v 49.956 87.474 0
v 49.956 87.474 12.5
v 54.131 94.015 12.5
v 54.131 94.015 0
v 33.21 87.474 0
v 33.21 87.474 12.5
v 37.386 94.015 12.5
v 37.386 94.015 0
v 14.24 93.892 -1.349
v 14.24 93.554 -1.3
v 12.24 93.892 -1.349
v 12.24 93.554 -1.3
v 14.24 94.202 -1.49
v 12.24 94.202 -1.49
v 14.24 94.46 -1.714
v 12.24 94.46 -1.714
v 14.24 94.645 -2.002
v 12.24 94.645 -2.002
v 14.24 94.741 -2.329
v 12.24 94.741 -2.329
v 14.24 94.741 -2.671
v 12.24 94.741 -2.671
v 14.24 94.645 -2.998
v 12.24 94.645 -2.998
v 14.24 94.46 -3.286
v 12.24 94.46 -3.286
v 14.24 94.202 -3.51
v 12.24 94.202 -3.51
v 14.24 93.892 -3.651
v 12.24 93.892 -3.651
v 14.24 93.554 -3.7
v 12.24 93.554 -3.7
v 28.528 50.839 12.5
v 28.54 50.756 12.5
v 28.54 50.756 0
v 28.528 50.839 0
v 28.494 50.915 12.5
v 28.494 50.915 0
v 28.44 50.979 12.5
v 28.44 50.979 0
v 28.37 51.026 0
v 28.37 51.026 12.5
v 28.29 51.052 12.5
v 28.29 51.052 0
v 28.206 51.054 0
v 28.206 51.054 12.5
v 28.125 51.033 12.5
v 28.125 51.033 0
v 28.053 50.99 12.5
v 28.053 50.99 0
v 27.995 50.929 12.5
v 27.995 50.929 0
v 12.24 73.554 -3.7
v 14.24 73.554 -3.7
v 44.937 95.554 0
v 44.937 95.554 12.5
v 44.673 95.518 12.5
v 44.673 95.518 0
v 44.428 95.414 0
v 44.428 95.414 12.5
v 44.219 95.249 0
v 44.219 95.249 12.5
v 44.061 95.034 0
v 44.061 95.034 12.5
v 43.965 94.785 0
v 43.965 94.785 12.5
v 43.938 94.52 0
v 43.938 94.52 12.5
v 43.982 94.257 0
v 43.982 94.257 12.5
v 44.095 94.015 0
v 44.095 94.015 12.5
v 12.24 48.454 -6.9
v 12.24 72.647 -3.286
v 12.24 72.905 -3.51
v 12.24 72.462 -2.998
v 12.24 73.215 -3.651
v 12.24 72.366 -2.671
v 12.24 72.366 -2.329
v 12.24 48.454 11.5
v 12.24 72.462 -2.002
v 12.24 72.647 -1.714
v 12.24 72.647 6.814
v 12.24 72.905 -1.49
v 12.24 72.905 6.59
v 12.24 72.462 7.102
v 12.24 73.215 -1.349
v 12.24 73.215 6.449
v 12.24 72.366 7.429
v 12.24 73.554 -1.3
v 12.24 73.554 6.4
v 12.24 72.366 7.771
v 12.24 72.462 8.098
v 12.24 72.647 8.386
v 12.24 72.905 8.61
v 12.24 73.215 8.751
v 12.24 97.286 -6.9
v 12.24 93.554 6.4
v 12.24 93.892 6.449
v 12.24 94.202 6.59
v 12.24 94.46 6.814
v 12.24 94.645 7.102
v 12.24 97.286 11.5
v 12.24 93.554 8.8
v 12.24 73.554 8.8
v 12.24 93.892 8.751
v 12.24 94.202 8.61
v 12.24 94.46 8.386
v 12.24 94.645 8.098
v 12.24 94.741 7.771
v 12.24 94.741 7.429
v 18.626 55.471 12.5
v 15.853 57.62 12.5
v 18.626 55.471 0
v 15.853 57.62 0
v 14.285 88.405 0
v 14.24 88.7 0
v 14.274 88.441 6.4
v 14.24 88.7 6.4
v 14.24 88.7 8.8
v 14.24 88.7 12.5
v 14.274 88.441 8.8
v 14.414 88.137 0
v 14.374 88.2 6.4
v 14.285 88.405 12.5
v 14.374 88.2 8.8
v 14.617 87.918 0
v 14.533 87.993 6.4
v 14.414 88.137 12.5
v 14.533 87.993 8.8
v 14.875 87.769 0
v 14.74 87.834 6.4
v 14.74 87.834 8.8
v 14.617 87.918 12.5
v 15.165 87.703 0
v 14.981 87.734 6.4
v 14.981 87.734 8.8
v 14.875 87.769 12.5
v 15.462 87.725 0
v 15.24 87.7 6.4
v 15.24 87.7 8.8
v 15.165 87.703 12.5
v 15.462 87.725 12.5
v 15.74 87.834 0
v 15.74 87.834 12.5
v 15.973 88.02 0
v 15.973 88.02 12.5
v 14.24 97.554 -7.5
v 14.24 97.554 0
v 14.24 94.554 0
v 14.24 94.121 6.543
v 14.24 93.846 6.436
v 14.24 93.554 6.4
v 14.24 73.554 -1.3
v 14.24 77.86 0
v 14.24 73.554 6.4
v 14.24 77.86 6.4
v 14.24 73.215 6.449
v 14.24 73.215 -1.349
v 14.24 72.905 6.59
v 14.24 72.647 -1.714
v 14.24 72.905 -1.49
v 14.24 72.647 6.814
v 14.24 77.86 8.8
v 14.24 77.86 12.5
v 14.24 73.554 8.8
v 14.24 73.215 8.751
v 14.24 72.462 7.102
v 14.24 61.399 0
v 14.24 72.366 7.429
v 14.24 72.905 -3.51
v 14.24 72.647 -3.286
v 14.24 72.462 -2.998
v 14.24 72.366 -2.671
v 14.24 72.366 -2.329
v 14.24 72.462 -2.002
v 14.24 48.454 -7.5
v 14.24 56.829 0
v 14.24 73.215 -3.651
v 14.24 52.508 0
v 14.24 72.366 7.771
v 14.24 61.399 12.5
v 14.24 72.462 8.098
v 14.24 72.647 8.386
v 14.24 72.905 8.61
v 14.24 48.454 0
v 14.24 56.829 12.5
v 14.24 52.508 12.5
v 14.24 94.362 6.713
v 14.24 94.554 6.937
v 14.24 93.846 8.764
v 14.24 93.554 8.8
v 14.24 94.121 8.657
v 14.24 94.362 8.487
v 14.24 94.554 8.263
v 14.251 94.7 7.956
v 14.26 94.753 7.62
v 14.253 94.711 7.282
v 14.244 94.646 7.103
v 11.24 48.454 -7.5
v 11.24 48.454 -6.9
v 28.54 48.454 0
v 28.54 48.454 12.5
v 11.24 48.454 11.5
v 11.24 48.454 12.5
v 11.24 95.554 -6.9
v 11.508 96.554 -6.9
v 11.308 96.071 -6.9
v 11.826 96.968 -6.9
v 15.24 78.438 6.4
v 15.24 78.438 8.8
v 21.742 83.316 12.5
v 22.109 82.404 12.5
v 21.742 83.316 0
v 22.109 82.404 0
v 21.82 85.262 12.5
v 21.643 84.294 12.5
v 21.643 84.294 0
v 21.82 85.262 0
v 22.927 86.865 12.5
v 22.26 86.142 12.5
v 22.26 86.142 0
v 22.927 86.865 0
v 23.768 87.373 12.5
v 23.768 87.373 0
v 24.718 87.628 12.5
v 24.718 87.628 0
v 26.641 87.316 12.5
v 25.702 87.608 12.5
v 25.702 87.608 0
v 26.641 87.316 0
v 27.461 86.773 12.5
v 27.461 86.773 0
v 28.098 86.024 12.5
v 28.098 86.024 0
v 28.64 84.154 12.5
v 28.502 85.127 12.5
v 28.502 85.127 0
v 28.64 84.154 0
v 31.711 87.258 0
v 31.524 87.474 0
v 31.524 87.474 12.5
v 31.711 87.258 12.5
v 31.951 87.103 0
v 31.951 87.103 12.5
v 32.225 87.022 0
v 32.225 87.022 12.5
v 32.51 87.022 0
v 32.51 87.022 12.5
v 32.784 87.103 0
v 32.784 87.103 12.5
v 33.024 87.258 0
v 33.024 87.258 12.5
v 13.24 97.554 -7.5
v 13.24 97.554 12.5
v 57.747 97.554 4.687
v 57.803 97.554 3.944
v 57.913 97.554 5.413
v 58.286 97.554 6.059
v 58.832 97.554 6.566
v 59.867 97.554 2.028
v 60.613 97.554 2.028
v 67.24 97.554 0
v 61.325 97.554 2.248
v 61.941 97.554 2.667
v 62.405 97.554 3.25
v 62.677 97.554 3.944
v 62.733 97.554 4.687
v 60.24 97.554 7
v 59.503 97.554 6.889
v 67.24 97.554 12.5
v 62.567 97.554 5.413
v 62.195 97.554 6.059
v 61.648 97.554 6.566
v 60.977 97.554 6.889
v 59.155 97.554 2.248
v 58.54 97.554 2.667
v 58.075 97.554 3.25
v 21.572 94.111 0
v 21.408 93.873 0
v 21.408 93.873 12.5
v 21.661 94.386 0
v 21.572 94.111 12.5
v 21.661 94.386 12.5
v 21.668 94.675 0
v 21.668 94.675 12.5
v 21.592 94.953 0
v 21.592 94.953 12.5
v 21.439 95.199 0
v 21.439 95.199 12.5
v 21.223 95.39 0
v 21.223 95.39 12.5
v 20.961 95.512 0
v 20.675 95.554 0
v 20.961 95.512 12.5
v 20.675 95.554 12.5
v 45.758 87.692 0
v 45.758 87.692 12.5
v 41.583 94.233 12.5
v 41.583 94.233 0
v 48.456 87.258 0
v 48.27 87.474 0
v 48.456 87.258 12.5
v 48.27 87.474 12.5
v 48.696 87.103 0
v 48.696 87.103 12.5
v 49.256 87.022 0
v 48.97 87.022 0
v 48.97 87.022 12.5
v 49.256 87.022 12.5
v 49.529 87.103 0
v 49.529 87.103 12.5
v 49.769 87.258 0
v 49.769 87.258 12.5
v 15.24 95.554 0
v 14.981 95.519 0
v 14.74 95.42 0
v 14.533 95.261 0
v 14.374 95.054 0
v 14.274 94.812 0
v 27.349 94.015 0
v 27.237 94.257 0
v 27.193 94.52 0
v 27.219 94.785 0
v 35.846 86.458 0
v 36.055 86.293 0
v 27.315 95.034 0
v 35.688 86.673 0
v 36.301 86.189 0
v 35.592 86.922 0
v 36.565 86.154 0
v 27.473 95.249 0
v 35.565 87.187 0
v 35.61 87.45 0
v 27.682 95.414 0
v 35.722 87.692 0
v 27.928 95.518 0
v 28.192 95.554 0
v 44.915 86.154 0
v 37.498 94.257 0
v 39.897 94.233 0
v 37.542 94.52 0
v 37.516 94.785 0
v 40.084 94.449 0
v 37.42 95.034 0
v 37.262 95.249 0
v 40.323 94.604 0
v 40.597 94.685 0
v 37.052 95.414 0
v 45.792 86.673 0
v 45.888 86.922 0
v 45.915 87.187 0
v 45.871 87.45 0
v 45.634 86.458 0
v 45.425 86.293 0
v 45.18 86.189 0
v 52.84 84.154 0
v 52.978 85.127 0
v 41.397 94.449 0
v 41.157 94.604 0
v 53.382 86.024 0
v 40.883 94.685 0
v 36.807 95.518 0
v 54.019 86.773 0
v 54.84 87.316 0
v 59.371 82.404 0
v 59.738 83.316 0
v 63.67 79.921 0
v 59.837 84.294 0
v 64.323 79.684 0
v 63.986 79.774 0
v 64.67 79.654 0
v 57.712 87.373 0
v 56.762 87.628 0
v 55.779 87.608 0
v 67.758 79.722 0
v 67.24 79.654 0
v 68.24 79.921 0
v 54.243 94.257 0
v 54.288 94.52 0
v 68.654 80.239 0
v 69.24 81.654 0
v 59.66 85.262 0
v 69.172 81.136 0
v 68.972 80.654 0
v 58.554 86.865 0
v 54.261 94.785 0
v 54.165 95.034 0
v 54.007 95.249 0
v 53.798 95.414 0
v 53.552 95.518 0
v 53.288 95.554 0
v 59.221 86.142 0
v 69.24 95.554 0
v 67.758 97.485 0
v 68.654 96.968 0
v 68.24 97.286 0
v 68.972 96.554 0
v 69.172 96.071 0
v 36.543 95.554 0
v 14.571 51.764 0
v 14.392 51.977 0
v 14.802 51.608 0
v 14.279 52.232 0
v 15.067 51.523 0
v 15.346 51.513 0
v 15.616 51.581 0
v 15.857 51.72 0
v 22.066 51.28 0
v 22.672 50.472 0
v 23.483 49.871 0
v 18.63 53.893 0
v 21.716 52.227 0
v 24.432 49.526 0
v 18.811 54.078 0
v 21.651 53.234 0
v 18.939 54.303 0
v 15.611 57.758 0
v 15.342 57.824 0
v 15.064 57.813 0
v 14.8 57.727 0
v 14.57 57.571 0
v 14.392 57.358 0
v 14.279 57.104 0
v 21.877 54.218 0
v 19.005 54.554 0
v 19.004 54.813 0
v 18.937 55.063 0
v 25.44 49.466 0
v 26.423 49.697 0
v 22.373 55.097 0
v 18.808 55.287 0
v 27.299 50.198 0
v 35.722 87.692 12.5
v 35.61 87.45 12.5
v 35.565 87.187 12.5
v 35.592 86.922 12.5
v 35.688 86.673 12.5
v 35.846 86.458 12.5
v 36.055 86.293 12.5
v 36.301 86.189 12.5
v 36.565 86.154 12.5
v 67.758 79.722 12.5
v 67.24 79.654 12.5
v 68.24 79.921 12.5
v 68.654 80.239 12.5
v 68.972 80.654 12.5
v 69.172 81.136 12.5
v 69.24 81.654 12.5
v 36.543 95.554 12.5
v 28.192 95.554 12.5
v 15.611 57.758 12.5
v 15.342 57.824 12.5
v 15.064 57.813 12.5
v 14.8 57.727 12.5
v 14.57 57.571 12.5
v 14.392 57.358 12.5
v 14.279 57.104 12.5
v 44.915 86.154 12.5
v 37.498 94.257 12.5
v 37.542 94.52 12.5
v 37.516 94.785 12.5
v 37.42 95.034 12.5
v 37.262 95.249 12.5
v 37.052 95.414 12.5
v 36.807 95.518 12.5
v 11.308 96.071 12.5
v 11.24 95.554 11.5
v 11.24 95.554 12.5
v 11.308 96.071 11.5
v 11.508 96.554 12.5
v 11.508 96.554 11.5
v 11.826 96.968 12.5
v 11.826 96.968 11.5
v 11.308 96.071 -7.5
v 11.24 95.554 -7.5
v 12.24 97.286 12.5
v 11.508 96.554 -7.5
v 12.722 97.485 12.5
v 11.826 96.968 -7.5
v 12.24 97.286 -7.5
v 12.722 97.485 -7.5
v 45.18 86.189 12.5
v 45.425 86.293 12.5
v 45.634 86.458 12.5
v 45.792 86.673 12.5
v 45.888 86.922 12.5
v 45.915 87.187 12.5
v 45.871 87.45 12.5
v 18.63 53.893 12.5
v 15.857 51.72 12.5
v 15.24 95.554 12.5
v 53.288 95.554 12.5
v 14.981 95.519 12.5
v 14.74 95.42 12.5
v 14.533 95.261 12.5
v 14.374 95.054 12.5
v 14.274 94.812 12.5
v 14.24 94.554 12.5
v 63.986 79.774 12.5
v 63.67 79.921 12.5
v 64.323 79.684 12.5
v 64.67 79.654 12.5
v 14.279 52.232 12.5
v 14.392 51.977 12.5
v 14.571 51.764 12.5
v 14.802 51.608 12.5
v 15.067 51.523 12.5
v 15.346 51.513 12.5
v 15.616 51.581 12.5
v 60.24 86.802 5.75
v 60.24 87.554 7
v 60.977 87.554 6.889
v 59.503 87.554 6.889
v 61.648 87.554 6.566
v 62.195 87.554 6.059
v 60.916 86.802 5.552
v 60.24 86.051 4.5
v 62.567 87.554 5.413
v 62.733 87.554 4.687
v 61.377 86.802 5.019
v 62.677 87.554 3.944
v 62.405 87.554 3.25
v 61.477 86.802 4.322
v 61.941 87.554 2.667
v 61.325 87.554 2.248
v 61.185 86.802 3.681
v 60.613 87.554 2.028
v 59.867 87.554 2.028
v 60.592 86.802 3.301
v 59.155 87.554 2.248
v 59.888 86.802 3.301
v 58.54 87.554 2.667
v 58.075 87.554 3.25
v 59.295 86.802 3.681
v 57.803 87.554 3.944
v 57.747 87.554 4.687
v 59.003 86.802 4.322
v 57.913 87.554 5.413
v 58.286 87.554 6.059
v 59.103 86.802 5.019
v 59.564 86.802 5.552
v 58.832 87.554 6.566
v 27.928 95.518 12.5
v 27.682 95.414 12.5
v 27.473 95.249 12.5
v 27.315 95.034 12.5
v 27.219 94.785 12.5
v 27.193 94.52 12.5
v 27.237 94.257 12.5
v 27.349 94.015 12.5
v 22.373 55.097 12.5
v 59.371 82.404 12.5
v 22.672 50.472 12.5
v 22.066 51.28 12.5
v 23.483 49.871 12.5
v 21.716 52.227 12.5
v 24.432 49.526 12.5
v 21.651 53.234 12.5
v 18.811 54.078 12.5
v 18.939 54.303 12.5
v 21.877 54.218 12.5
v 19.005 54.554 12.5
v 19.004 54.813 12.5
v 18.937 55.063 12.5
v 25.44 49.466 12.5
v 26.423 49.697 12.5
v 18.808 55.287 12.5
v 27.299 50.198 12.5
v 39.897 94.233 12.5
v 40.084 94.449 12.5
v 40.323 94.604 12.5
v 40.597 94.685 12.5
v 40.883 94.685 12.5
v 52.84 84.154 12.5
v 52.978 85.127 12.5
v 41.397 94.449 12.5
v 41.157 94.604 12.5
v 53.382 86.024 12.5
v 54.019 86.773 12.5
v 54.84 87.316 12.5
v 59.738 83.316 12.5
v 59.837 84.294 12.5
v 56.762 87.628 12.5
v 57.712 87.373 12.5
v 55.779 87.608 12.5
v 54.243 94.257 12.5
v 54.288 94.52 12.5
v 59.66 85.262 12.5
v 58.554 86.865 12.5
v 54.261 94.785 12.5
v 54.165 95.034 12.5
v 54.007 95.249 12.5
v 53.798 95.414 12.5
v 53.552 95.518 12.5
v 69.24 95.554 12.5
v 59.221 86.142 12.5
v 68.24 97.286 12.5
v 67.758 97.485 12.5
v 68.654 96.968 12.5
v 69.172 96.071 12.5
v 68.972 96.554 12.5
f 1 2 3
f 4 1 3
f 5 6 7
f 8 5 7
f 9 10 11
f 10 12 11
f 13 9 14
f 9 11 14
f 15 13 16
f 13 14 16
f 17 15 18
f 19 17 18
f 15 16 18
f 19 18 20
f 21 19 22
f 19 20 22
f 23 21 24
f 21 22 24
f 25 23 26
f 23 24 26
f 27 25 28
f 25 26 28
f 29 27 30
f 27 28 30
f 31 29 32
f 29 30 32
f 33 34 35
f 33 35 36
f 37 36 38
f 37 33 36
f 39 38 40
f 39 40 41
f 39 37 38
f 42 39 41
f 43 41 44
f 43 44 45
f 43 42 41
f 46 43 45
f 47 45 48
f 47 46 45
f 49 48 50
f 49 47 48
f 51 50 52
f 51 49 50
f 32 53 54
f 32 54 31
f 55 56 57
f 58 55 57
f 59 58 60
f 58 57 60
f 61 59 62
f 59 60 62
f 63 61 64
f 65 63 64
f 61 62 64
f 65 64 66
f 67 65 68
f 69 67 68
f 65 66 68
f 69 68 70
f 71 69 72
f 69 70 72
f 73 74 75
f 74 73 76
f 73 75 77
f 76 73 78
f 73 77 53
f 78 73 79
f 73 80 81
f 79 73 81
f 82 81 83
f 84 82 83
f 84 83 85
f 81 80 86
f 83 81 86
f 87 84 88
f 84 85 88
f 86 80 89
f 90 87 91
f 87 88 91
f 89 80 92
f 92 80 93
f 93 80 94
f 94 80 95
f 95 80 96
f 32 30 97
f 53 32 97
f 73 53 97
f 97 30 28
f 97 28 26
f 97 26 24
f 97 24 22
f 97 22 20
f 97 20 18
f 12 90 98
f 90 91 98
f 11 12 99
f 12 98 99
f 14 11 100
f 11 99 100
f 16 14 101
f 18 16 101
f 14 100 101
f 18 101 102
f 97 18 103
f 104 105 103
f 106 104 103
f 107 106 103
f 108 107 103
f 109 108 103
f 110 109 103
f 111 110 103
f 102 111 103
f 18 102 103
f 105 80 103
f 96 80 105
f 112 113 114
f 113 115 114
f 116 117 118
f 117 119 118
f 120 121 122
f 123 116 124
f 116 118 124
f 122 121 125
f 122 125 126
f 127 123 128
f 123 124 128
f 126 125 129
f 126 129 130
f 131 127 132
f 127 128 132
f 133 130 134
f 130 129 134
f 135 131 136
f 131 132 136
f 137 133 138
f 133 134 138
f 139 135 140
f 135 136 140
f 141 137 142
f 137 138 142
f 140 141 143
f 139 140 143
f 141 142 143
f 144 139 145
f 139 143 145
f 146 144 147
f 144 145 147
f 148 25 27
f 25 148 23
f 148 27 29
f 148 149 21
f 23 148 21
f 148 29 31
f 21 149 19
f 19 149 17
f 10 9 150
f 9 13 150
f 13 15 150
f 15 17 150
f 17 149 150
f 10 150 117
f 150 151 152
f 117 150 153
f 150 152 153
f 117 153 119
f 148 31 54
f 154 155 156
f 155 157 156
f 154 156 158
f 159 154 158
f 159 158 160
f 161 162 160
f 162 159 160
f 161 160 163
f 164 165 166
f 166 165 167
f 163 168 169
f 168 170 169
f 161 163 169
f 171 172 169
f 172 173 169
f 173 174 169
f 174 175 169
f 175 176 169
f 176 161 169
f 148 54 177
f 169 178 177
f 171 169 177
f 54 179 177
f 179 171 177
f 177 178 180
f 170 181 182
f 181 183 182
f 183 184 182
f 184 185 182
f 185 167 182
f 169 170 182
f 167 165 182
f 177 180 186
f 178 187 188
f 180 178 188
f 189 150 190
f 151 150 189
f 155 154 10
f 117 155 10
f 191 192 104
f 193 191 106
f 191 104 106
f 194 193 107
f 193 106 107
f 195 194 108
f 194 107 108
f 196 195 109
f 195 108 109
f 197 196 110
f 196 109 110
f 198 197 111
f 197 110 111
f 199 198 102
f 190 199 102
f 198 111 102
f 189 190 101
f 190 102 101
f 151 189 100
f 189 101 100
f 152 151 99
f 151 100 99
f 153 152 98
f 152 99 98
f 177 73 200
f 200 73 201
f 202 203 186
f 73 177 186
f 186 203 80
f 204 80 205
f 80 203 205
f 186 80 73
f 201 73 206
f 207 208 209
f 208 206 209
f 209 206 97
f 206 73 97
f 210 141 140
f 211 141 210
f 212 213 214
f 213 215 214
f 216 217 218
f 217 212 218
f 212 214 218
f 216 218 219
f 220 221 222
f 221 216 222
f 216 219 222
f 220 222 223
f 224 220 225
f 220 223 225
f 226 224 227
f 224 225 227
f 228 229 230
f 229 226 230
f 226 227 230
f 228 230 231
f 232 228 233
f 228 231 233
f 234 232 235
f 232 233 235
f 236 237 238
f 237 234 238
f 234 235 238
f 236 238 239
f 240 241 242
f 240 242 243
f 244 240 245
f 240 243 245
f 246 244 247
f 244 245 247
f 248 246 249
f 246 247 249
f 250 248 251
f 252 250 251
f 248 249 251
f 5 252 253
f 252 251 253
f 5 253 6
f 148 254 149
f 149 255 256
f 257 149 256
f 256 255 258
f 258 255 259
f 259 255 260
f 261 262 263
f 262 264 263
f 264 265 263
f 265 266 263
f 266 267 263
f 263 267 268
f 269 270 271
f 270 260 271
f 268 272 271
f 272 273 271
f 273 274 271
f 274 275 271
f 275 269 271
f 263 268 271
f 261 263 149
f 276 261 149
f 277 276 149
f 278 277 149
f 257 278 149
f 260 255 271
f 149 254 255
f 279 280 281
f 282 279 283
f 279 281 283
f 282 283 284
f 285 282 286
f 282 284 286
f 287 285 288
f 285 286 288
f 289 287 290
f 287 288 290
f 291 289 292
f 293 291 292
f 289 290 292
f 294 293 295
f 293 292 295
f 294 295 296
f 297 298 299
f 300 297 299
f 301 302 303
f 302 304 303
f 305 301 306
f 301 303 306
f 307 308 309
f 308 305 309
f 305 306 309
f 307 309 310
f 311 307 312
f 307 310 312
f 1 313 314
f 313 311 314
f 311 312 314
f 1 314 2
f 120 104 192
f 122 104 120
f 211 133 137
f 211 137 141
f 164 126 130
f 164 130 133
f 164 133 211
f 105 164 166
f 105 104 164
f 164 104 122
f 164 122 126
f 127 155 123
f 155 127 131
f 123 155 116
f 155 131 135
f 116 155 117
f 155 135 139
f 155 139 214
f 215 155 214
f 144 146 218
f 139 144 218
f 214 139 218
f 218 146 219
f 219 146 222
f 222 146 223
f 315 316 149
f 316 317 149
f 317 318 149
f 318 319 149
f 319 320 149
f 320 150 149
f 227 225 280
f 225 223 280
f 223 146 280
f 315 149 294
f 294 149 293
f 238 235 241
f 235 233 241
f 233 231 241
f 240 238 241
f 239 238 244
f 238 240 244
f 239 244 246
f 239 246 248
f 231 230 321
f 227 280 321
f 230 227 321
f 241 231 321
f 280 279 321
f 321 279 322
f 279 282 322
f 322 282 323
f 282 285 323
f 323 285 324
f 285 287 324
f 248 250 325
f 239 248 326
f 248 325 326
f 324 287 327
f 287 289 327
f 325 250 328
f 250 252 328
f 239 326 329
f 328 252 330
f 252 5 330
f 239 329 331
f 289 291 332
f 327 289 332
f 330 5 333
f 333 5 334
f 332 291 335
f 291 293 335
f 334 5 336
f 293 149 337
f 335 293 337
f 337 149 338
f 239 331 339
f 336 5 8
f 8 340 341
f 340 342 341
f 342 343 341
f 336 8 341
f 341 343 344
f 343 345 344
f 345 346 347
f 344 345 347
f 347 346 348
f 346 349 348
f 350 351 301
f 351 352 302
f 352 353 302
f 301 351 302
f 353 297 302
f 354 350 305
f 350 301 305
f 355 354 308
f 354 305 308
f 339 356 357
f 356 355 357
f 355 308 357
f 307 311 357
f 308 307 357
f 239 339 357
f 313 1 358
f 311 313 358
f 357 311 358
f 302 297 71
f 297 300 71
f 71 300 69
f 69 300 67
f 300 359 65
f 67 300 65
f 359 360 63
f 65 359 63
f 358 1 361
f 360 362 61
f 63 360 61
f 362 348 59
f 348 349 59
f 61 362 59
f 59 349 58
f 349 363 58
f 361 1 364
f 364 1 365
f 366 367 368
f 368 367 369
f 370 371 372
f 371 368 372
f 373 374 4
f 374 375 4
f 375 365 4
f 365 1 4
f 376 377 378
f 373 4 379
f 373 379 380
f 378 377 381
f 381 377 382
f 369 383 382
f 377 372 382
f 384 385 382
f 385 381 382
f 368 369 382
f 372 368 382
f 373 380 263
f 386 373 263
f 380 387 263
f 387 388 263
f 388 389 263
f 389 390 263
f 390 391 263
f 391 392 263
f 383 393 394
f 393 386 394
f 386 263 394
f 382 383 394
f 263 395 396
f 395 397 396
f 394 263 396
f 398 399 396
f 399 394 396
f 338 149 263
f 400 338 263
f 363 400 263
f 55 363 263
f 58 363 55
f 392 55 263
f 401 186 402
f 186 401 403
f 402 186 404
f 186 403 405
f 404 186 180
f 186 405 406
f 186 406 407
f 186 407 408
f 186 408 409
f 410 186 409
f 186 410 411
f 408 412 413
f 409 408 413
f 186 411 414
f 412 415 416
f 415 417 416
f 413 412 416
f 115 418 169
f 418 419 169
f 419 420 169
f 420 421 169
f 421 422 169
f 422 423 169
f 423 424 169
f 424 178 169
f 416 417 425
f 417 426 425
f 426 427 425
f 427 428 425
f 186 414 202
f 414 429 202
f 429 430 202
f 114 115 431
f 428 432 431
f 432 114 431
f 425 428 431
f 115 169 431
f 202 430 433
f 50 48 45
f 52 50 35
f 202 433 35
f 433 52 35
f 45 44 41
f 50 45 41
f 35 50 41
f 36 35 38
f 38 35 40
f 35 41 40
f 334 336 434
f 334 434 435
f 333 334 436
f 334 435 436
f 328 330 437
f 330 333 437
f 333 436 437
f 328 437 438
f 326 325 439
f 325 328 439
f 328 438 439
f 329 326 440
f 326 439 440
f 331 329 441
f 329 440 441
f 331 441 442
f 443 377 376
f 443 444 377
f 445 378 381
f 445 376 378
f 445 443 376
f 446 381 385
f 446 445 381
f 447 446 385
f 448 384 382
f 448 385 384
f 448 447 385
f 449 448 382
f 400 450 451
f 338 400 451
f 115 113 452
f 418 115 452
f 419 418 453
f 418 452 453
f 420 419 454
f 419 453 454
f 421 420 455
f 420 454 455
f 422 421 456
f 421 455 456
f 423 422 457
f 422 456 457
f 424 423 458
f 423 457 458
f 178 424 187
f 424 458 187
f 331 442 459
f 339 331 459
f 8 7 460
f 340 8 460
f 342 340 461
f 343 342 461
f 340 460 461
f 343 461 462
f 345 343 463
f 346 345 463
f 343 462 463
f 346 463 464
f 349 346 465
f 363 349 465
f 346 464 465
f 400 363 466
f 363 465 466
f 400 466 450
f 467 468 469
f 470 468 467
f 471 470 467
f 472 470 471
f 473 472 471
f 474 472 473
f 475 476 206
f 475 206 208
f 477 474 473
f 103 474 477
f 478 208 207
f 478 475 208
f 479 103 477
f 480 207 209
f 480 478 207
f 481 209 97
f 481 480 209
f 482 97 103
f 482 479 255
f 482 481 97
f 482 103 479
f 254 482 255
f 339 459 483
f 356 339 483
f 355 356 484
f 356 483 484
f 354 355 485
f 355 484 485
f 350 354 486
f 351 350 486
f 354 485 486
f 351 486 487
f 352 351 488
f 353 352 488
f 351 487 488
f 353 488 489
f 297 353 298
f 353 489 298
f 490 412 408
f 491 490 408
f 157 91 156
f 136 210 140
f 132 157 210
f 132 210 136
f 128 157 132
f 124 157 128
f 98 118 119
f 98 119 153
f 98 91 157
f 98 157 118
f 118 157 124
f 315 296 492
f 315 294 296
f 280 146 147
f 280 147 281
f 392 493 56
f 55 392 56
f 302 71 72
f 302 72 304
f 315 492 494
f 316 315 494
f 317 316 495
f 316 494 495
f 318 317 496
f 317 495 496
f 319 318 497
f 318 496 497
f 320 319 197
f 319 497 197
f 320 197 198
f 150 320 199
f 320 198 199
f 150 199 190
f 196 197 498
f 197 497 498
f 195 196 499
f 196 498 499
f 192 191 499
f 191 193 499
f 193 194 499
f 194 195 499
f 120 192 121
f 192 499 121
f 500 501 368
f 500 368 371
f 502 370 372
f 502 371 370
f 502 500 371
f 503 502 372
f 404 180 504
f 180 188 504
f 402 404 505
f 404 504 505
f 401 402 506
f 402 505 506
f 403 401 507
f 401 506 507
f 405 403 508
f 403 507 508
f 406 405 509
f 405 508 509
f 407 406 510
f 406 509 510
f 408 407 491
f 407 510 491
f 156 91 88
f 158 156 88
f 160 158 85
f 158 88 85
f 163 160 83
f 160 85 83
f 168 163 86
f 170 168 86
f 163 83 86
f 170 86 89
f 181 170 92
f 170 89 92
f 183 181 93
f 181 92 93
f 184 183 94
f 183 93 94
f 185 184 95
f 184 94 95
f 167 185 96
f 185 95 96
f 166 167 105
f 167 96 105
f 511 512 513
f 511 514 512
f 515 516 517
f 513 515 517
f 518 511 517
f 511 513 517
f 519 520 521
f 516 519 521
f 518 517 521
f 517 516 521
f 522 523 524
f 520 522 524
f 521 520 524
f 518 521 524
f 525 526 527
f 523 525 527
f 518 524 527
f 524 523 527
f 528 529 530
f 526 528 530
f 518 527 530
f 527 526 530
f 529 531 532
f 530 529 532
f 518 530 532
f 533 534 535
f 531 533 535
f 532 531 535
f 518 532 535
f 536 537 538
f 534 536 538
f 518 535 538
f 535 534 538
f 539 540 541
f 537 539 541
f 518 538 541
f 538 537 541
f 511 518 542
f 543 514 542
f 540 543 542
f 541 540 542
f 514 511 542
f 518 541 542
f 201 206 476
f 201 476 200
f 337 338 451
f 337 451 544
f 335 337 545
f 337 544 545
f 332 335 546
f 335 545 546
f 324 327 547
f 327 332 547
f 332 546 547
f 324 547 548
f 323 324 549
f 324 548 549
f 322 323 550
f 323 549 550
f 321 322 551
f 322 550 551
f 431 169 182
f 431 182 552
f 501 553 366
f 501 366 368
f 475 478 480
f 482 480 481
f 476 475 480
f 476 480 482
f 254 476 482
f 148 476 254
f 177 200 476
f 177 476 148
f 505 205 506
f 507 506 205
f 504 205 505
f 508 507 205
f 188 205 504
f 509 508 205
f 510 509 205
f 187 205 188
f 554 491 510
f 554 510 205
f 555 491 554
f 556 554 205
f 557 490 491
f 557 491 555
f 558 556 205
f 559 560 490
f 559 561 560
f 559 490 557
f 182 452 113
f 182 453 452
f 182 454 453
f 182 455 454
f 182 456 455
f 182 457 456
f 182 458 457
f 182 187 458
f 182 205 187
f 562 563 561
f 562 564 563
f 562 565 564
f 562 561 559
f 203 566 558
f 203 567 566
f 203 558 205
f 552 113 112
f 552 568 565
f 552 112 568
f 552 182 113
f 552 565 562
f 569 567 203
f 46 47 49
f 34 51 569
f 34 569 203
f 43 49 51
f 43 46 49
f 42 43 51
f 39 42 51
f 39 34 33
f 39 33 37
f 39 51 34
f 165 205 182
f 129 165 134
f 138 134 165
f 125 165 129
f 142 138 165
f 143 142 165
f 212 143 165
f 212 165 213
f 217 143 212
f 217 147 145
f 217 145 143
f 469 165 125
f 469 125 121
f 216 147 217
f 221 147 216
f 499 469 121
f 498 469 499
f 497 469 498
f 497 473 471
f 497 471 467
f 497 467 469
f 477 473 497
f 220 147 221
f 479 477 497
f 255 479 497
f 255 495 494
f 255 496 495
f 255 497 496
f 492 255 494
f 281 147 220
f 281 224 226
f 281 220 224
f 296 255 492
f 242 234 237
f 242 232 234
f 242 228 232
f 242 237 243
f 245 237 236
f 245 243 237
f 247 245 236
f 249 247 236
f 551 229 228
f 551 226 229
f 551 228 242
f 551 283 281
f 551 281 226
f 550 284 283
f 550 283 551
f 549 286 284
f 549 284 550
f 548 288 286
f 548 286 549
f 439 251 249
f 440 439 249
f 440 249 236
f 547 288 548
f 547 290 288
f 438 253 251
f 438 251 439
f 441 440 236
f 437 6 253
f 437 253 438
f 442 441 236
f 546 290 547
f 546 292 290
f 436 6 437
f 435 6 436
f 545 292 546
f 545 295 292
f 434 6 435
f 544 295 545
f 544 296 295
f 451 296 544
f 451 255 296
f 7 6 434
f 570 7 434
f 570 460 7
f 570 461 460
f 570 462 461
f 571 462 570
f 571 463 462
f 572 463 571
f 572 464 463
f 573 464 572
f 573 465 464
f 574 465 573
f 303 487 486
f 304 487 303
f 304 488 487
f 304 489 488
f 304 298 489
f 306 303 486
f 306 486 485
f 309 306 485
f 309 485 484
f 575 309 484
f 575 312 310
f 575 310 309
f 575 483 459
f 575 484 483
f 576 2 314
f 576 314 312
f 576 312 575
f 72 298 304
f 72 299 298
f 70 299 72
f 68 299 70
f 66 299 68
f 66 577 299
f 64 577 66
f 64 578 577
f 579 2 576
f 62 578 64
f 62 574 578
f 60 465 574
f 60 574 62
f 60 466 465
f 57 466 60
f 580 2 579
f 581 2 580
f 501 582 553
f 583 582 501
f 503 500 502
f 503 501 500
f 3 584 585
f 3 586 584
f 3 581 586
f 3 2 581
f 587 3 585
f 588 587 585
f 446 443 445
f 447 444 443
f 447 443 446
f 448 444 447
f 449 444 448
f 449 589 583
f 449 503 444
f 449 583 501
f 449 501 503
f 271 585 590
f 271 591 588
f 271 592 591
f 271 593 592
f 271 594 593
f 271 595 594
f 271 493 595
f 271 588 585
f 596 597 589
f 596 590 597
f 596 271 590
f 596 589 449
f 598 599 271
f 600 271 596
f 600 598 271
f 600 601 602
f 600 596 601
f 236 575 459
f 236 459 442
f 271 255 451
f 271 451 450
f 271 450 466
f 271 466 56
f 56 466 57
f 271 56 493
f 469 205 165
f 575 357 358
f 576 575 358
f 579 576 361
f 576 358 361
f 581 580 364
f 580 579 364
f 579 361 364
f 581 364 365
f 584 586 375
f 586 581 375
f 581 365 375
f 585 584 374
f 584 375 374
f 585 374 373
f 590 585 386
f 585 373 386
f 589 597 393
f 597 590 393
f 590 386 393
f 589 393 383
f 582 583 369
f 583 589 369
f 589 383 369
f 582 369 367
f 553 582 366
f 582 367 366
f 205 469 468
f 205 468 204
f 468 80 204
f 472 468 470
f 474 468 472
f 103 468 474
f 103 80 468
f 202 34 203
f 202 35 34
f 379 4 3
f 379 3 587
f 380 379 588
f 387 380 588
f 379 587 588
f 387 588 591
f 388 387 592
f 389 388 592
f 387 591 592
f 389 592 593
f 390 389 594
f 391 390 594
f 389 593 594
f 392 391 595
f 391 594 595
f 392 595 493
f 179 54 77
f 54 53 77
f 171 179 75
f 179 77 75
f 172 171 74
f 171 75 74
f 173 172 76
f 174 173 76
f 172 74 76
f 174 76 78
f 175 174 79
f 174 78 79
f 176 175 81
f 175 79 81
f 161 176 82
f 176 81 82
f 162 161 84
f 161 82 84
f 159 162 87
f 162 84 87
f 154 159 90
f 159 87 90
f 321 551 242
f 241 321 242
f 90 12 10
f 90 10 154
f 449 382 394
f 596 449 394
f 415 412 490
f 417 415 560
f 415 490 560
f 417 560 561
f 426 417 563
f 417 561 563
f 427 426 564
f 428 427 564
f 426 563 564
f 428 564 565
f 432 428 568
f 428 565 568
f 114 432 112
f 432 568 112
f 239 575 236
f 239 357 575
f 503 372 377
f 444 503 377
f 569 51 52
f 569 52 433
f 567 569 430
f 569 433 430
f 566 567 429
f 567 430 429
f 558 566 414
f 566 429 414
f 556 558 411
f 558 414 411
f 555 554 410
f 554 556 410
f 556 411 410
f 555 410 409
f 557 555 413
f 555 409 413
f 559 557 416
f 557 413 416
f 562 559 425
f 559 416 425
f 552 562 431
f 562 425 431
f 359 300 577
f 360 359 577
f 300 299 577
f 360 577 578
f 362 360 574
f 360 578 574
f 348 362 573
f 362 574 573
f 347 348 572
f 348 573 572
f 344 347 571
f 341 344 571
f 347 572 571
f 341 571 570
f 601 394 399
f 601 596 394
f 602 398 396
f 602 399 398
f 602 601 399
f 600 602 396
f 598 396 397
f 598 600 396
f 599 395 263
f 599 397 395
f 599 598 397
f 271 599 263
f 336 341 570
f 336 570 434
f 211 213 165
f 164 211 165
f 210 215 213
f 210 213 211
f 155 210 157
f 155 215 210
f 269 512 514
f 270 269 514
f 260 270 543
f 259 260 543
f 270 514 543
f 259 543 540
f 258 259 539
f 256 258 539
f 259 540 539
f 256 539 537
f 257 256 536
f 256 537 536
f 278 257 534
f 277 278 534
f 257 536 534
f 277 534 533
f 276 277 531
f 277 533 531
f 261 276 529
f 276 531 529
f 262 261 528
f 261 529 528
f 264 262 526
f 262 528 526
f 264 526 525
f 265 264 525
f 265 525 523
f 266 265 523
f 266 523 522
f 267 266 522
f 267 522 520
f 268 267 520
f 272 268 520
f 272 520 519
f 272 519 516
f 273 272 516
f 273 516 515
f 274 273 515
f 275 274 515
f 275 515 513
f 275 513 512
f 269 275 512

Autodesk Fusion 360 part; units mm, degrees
sketch "Sketch1" plane through (0, 0, 0) normal (0, 0, 1) x (1, 0, 0)
  line L0 (69.2401, 97.5535) -> (12.2401, 97.5535)
  line L1 (12.2401, 97.5535) -> (12.2401, 48.4535)
  line L2 (52.8401, 84.1535) -> (28.6401, 84.1535)
  line L3 (59.3712, 82.4035) -> (64.1343, 79.6535)
  line L4 (64.1343, 79.6535) -> (69.2401, 79.6535)
  line L5 (69.2401, 79.6535) -> (69.2401, 97.5535)
  line L6 (22.109, 82.4035) -> (14.2401, 77.8603)
  line L7 (14.2401, 77.8603) -> (14.2401, 61.3991)
  line L8 (14.2401, 61.3991) -> (22.3734, 55.0972)
  line L9 (28.5401, 52.1228) -> (28.5401, 48.4535)
  line L10 (28.5401, 48.4535) -> (12.2401, 48.4535)
  arc A0 (59.3712, 82.4035) -> (52.8401, 84.1535) centre (56.3401, 84.1535) ccw
  arc A1 (28.6401, 84.1535) -> (22.109, 82.4035) centre (25.1401, 84.1535) ccw
  arc A2 (22.3734, 55.0972) -> (28.5401, 52.1228) centre (25.1401, 52.9535) ccw
  line L11 (14.2401, 50.4535) -> (14.2401, 58.869)
  line L12 (14.2401, 58.869) -> (19.6401, 54.6849)
  line L13 (19.6401, 54.6849) -> (14.2401, 50.4535)
  line L14 (14.2401, 86.1535) -> (22.9682, 95.5535)
  line L15 (22.9682, 95.5535) -> (14.2401, 95.5535)
  line L16 (14.2401, 95.5535) -> (14.2401, 86.1535)
  line L17 (26.3674, 95.5535) -> (32.3674, 86.1535)
  line L18 (32.3674, 86.1535) -> (38.3674, 95.5535)
  line L19 (38.3674, 95.5535) -> (26.3674, 95.5535)
  line L20 (49.1128, 86.1535) -> (55.1128, 95.5535)
  line L21 (55.1128, 95.5535) -> (43.1128, 95.5535)
  line L22 (43.1128, 95.5535) -> (49.1128, 86.1535)
  line L23 (34.7401, 86.1535) -> (46.7401, 86.1535)
  line L24 (46.7401, 86.1535) -> (40.7401, 95.5535)
  line L25 (40.7401, 95.5535) -> (34.7401, 86.1535)
  dimension "d1" = 7
  dimension "d2" = 7
  dimension "d3" = 31.2
  dimension "d10" = 7
  dimension "d11" = 150
  dimension "d12" = 150
  dimension "d13" = 127.769
  dimension "d14" = 12.9
  dimension "d15" = 12.9
  dimension "d16" = 31.2
  dimension "d17" = 4.5
  dimension "d18" = 13.4
  dimension "d19" = 12.9
  dimension "d21" = 4.5
  dimension "d23" = 2
  dimension "d24" = 5.5
  dimension "d25" = 2
  dimension "d26" = 2
  dimension "d27" = 2
  dimension "d35" = 2
  dimension "d36" = 2
  dimension "d37" = 2
  dimension "d38" = 2
  dimension "d39" = 2
  dimension "d40" = 2
  dimension "d41" = 2
  dimension "d42" = 2
  dimension "d43" = 2
  dimension "d44" = 2
  dimension "d45" = 12
  dimension "d46" = 15.6
  dimension "d47" = 2
  dimension "d74" = 90
  dimension "d77" = 3.4
extrude "Extrude1" add sketch "Sketch1" along normal blind 12.5
sketch "Sketch2" plane through (0, 97.5535, 0) normal (0, 1, 0) x (-1, 0, 0)
  line L0 (-69.2401, 0) -> (-12.2401, 0)
  line L1 (-12.2401, 0) -> (-12.2401, 12.5)
  line L2 (-12.2401, 12.5) -> (-69.2401, 12.5)
  line L3 (-69.2401, 12.5) -> (-69.2401, 0)
  point P0 (-60.2401, 4.5)
  dimension "d30" = 9
  dimension "d31" = 8
hole "Hole1" at (60.2401, 97.5535, 4.5) direction (0, -1, 0) diameter 5 depth 10 tip angle 118
fillet "Fillet2" radius 1 15 edges at (55.1128, 95.5535, 6.25) (43.1128, 95.5535, 6.25) (49.1128, 86.1535, 6.25) (46.7401, 86.1535, 6.25) (40.7401, 95.5535, 6.25) (34.7401, 86.1535, 6.25) (38.3674, 95.5535, 6.25) (32.3674, 86.1535, 6.25) (26.3674, 95.5535, 6.25) (22.9682, 95.5535, 6.25) (14.2401, 86.1535, 6.25) (14.2401, 95.5535, 6.25) (19.6401, 54.6849, 6.25) (14.2401, 58.869, 6.25) (14.2401, 50.4535, 6.25)
sketch "Sketch3" plane through (0, 0, 0) normal (0, 0, -1) x (1, 0, 0)
  line L0 (69.2401, -79.6535) -> (64.1343, -79.6535)
  line L1 (64.1343, -79.6535) -> (59.3712, -82.4035)
  arc A0 (52.8401, -84.1535) -> (59.3712, -82.4035) centre (56.3401, -84.1535) ccw
  line L2 (52.8401, -84.1535) -> (28.6401, -84.1535)
  arc A1 (22.109, -82.4035) -> (28.6401, -84.1535) centre (25.1401, -84.1535) ccw
  line L3 (22.109, -82.4035) -> (14.2401, -77.8603)
  line L4 (14.2401, -77.8603) -> (14.2401, -61.3991)
  line L5 (14.2401, -61.3991) -> (22.3734, -55.0972)
  arc A2 (28.5401, -52.1228) -> (22.3734, -55.0972) centre (25.1401, -52.9535) ccw
  line L6 (28.5401, -52.1228) -> (28.5401, -48.4535)
  line L7 (28.5401, -48.4535) -> (12.2401, -48.4535)
  line L8 (12.2401, -48.4535) -> (12.2401, -97.5535)
  line L9 (12.2401, -97.5535) -> (69.2401, -97.5535)
  line L10 (69.2401, -97.5535) -> (69.2401, -79.6535)
  arc A3 (27.3491, -94.0154) -> (28.1921, -95.5535) centre (28.1921, -94.5535) ccw
  line L11 (27.3491, -94.0154) -> (31.5245, -87.474)
  arc A4 (33.2103, -87.474) -> (31.5245, -87.474) centre (32.3674, -88.0121) ccw
  line L12 (33.2103, -87.474) -> (37.3857, -94.0154)
  arc A5 (36.5428, -95.5535) -> (37.3857, -94.0154) centre (36.5428, -94.5535) ccw
  line L13 (36.5428, -95.5535) -> (28.1921, -95.5535)
  arc A6 (14.2401, -56.8291) -> (15.8526, -57.6196) centre (15.2401, -56.8291) ccw
  line L14 (14.2401, -56.8291) -> (14.2401, -52.5075)
  arc A7 (15.8569, -51.7204) -> (14.2401, -52.5075) centre (15.2401, -52.5075) ccw
  line L15 (15.8569, -51.7204) -> (18.6299, -53.8933)
  arc A8 (18.6256, -55.4709) -> (18.6299, -53.8933) centre (18.0131, -54.6805) ccw
  line L16 (18.6256, -55.4709) -> (15.8526, -57.6196)
  arc A9 (15.9729, -88.0197) -> (14.2401, -88.7001) centre (15.2401, -88.7001) ccw
  line L17 (15.9729, -88.0197) -> (21.4079, -93.873)
  arc A10 (20.6751, -95.5535) -> (21.4079, -93.873) centre (20.6751, -94.5535) ccw
  line L18 (20.6751, -95.5535) -> (15.2401, -95.5535)
  arc A11 (14.2401, -94.5535) -> (15.2401, -95.5535) centre (15.2401, -94.5535) ccw
  line L19 (14.2401, -94.5535) -> (14.2401, -88.7001)
  arc A12 (49.9557, -87.474) -> (48.2699, -87.474) centre (49.1128, -88.0121) ccw
  line L20 (49.9557, -87.474) -> (54.1311, -94.0154)
  arc A13 (53.2882, -95.5535) -> (54.1311, -94.0154) centre (53.2882, -94.5535) ccw
  line L21 (53.2882, -95.5535) -> (44.9375, -95.5535)
  arc A14 (44.0945, -94.0154) -> (44.9375, -95.5535) centre (44.9375, -94.5535) ccw
  line L22 (44.0945, -94.0154) -> (48.2699, -87.474)
  arc A15 (36.5648, -86.1535) -> (35.7218, -87.6915) centre (36.5648, -87.1535) ccw
  line L23 (36.5648, -86.1535) -> (44.9155, -86.1535)
  arc A16 (45.7584, -87.6915) -> (44.9155, -86.1535) centre (44.9155, -87.1535) ccw
  line L24 (45.7584, -87.6915) -> (41.583, -94.2329)
  arc A17 (39.8972, -94.2329) -> (41.583, -94.2329) centre (40.7401, -93.6948) ccw
  line L25 (39.8972, -94.2329) -> (35.7218, -87.6915)
  line L26 (12.2401, -48.4535) -> (14.2401, -48.4535)
  line L27 (12.2401, -48.4535) -> (12.2401, -97.5535)
  line L28 (12.2401, -97.5535) -> (14.2401, -97.5535)
  line L29 (14.2401, -97.5535) -> (14.2401, -48.4535)
  dimension "d51" = 2
  dimension "d52" = 2
extrude "Extrude2" add sketch "Sketch3" along normal blind 7.5 contours L4 L7 L8 L9 L14 L19 L26 L27 L28 L29
sketch "Sketch4" plane through (12.2401, 0, 0) normal (-1, 0, 0) x (0, -1, 0)
  line L0 (-48.4535, -7.5) -> (-48.4535, 12.5)
  line L1 (-48.4535, 12.5) -> (-97.5535, 12.5)
  line L2 (-97.5535, 12.5) -> (-97.5535, -7.5)
  line L3 (-97.5535, -7.5) -> (-48.4535, -7.5)
  line L4 (-93.5535, -1.3) -> (-73.5535, -1.3)
  arc A0 (-73.5535, -3.7) -> (-73.5535, -1.3) centre (-73.5535, -2.5) ccw
  line L5 (-73.5535, -3.7) -> (-93.5535, -3.7)
  arc A1 (-93.5535, -1.3) -> (-93.5535, -3.7) centre (-93.5535, -2.5) ccw
  arc A2 (-93.5535, 8.8) -> (-93.5535, 6.4) centre (-93.5535, 7.6) ccw
  arc A3 (-73.5535, 6.4) -> (-73.5535, 8.8) centre (-73.5535, 7.6) ccw
  line L6 (-73.5535, 6.4) -> (-93.5535, 6.4)
  line L7 (-93.5535, 8.8) -> (-73.5535, 8.8)
  line L8 (-97.5535, 12.5) -> (-48.4535, 12.5)
  line L9 (-48.4535, 12.5) -> (-48.4535, 11.5)
  line L10 (-48.4535, 11.5) -> (-97.5535, 11.5)
  line L11 (-97.5535, 11.5) -> (-97.5535, 12.5)
  line L12 (-97.5535, -7.5) -> (-48.4535, -7.5)
  line L13 (-48.4535, -7.5) -> (-48.4535, -6.9)
  line L14 (-48.4535, -6.9) -> (-97.5535, -6.9)
  line L15 (-97.5535, -6.9) -> (-97.5535, -7.5)
  dimension "d55" = 2.4
  dimension "d56" = 20
  dimension "d59" = 2.4
  dimension "d60" = 20
  dimension "d61" = 7.7
  dimension "d63" = 4
  dimension "d64" = 4
  dimension "d65" = 3.7
  dimension "d69" = 1
  dimension "d79" = 0.6
extrude "Extrude3" cut sketch "Sketch4" against normal blind 3 contours L4 A0 L5 A1 | A2 A3 L6 L7
extrude "Extrude4" add sketch "Sketch4" along normal blind 1 contours L0 L2 L3 L12 L13 L14 L15 | L0 L1 L2 L8 L9 L10 L11
fillet "Fillet3" radius 2 3 edges at (11.2401, 97.5535, -7.2) (11.2401, 97.5535, 12) (12.2401, 97.5535, 2.3)
fillet "Fillet3" radius 2 3 edges at (69.2401, 97.5535, 6.25) (69.2401, 79.6535, 6.25) (64.1343, 79.6535, 6.25)
fillet "Fillet3" radius 0.3 1 edges at (28.5401, 52.1228, 6.25)
